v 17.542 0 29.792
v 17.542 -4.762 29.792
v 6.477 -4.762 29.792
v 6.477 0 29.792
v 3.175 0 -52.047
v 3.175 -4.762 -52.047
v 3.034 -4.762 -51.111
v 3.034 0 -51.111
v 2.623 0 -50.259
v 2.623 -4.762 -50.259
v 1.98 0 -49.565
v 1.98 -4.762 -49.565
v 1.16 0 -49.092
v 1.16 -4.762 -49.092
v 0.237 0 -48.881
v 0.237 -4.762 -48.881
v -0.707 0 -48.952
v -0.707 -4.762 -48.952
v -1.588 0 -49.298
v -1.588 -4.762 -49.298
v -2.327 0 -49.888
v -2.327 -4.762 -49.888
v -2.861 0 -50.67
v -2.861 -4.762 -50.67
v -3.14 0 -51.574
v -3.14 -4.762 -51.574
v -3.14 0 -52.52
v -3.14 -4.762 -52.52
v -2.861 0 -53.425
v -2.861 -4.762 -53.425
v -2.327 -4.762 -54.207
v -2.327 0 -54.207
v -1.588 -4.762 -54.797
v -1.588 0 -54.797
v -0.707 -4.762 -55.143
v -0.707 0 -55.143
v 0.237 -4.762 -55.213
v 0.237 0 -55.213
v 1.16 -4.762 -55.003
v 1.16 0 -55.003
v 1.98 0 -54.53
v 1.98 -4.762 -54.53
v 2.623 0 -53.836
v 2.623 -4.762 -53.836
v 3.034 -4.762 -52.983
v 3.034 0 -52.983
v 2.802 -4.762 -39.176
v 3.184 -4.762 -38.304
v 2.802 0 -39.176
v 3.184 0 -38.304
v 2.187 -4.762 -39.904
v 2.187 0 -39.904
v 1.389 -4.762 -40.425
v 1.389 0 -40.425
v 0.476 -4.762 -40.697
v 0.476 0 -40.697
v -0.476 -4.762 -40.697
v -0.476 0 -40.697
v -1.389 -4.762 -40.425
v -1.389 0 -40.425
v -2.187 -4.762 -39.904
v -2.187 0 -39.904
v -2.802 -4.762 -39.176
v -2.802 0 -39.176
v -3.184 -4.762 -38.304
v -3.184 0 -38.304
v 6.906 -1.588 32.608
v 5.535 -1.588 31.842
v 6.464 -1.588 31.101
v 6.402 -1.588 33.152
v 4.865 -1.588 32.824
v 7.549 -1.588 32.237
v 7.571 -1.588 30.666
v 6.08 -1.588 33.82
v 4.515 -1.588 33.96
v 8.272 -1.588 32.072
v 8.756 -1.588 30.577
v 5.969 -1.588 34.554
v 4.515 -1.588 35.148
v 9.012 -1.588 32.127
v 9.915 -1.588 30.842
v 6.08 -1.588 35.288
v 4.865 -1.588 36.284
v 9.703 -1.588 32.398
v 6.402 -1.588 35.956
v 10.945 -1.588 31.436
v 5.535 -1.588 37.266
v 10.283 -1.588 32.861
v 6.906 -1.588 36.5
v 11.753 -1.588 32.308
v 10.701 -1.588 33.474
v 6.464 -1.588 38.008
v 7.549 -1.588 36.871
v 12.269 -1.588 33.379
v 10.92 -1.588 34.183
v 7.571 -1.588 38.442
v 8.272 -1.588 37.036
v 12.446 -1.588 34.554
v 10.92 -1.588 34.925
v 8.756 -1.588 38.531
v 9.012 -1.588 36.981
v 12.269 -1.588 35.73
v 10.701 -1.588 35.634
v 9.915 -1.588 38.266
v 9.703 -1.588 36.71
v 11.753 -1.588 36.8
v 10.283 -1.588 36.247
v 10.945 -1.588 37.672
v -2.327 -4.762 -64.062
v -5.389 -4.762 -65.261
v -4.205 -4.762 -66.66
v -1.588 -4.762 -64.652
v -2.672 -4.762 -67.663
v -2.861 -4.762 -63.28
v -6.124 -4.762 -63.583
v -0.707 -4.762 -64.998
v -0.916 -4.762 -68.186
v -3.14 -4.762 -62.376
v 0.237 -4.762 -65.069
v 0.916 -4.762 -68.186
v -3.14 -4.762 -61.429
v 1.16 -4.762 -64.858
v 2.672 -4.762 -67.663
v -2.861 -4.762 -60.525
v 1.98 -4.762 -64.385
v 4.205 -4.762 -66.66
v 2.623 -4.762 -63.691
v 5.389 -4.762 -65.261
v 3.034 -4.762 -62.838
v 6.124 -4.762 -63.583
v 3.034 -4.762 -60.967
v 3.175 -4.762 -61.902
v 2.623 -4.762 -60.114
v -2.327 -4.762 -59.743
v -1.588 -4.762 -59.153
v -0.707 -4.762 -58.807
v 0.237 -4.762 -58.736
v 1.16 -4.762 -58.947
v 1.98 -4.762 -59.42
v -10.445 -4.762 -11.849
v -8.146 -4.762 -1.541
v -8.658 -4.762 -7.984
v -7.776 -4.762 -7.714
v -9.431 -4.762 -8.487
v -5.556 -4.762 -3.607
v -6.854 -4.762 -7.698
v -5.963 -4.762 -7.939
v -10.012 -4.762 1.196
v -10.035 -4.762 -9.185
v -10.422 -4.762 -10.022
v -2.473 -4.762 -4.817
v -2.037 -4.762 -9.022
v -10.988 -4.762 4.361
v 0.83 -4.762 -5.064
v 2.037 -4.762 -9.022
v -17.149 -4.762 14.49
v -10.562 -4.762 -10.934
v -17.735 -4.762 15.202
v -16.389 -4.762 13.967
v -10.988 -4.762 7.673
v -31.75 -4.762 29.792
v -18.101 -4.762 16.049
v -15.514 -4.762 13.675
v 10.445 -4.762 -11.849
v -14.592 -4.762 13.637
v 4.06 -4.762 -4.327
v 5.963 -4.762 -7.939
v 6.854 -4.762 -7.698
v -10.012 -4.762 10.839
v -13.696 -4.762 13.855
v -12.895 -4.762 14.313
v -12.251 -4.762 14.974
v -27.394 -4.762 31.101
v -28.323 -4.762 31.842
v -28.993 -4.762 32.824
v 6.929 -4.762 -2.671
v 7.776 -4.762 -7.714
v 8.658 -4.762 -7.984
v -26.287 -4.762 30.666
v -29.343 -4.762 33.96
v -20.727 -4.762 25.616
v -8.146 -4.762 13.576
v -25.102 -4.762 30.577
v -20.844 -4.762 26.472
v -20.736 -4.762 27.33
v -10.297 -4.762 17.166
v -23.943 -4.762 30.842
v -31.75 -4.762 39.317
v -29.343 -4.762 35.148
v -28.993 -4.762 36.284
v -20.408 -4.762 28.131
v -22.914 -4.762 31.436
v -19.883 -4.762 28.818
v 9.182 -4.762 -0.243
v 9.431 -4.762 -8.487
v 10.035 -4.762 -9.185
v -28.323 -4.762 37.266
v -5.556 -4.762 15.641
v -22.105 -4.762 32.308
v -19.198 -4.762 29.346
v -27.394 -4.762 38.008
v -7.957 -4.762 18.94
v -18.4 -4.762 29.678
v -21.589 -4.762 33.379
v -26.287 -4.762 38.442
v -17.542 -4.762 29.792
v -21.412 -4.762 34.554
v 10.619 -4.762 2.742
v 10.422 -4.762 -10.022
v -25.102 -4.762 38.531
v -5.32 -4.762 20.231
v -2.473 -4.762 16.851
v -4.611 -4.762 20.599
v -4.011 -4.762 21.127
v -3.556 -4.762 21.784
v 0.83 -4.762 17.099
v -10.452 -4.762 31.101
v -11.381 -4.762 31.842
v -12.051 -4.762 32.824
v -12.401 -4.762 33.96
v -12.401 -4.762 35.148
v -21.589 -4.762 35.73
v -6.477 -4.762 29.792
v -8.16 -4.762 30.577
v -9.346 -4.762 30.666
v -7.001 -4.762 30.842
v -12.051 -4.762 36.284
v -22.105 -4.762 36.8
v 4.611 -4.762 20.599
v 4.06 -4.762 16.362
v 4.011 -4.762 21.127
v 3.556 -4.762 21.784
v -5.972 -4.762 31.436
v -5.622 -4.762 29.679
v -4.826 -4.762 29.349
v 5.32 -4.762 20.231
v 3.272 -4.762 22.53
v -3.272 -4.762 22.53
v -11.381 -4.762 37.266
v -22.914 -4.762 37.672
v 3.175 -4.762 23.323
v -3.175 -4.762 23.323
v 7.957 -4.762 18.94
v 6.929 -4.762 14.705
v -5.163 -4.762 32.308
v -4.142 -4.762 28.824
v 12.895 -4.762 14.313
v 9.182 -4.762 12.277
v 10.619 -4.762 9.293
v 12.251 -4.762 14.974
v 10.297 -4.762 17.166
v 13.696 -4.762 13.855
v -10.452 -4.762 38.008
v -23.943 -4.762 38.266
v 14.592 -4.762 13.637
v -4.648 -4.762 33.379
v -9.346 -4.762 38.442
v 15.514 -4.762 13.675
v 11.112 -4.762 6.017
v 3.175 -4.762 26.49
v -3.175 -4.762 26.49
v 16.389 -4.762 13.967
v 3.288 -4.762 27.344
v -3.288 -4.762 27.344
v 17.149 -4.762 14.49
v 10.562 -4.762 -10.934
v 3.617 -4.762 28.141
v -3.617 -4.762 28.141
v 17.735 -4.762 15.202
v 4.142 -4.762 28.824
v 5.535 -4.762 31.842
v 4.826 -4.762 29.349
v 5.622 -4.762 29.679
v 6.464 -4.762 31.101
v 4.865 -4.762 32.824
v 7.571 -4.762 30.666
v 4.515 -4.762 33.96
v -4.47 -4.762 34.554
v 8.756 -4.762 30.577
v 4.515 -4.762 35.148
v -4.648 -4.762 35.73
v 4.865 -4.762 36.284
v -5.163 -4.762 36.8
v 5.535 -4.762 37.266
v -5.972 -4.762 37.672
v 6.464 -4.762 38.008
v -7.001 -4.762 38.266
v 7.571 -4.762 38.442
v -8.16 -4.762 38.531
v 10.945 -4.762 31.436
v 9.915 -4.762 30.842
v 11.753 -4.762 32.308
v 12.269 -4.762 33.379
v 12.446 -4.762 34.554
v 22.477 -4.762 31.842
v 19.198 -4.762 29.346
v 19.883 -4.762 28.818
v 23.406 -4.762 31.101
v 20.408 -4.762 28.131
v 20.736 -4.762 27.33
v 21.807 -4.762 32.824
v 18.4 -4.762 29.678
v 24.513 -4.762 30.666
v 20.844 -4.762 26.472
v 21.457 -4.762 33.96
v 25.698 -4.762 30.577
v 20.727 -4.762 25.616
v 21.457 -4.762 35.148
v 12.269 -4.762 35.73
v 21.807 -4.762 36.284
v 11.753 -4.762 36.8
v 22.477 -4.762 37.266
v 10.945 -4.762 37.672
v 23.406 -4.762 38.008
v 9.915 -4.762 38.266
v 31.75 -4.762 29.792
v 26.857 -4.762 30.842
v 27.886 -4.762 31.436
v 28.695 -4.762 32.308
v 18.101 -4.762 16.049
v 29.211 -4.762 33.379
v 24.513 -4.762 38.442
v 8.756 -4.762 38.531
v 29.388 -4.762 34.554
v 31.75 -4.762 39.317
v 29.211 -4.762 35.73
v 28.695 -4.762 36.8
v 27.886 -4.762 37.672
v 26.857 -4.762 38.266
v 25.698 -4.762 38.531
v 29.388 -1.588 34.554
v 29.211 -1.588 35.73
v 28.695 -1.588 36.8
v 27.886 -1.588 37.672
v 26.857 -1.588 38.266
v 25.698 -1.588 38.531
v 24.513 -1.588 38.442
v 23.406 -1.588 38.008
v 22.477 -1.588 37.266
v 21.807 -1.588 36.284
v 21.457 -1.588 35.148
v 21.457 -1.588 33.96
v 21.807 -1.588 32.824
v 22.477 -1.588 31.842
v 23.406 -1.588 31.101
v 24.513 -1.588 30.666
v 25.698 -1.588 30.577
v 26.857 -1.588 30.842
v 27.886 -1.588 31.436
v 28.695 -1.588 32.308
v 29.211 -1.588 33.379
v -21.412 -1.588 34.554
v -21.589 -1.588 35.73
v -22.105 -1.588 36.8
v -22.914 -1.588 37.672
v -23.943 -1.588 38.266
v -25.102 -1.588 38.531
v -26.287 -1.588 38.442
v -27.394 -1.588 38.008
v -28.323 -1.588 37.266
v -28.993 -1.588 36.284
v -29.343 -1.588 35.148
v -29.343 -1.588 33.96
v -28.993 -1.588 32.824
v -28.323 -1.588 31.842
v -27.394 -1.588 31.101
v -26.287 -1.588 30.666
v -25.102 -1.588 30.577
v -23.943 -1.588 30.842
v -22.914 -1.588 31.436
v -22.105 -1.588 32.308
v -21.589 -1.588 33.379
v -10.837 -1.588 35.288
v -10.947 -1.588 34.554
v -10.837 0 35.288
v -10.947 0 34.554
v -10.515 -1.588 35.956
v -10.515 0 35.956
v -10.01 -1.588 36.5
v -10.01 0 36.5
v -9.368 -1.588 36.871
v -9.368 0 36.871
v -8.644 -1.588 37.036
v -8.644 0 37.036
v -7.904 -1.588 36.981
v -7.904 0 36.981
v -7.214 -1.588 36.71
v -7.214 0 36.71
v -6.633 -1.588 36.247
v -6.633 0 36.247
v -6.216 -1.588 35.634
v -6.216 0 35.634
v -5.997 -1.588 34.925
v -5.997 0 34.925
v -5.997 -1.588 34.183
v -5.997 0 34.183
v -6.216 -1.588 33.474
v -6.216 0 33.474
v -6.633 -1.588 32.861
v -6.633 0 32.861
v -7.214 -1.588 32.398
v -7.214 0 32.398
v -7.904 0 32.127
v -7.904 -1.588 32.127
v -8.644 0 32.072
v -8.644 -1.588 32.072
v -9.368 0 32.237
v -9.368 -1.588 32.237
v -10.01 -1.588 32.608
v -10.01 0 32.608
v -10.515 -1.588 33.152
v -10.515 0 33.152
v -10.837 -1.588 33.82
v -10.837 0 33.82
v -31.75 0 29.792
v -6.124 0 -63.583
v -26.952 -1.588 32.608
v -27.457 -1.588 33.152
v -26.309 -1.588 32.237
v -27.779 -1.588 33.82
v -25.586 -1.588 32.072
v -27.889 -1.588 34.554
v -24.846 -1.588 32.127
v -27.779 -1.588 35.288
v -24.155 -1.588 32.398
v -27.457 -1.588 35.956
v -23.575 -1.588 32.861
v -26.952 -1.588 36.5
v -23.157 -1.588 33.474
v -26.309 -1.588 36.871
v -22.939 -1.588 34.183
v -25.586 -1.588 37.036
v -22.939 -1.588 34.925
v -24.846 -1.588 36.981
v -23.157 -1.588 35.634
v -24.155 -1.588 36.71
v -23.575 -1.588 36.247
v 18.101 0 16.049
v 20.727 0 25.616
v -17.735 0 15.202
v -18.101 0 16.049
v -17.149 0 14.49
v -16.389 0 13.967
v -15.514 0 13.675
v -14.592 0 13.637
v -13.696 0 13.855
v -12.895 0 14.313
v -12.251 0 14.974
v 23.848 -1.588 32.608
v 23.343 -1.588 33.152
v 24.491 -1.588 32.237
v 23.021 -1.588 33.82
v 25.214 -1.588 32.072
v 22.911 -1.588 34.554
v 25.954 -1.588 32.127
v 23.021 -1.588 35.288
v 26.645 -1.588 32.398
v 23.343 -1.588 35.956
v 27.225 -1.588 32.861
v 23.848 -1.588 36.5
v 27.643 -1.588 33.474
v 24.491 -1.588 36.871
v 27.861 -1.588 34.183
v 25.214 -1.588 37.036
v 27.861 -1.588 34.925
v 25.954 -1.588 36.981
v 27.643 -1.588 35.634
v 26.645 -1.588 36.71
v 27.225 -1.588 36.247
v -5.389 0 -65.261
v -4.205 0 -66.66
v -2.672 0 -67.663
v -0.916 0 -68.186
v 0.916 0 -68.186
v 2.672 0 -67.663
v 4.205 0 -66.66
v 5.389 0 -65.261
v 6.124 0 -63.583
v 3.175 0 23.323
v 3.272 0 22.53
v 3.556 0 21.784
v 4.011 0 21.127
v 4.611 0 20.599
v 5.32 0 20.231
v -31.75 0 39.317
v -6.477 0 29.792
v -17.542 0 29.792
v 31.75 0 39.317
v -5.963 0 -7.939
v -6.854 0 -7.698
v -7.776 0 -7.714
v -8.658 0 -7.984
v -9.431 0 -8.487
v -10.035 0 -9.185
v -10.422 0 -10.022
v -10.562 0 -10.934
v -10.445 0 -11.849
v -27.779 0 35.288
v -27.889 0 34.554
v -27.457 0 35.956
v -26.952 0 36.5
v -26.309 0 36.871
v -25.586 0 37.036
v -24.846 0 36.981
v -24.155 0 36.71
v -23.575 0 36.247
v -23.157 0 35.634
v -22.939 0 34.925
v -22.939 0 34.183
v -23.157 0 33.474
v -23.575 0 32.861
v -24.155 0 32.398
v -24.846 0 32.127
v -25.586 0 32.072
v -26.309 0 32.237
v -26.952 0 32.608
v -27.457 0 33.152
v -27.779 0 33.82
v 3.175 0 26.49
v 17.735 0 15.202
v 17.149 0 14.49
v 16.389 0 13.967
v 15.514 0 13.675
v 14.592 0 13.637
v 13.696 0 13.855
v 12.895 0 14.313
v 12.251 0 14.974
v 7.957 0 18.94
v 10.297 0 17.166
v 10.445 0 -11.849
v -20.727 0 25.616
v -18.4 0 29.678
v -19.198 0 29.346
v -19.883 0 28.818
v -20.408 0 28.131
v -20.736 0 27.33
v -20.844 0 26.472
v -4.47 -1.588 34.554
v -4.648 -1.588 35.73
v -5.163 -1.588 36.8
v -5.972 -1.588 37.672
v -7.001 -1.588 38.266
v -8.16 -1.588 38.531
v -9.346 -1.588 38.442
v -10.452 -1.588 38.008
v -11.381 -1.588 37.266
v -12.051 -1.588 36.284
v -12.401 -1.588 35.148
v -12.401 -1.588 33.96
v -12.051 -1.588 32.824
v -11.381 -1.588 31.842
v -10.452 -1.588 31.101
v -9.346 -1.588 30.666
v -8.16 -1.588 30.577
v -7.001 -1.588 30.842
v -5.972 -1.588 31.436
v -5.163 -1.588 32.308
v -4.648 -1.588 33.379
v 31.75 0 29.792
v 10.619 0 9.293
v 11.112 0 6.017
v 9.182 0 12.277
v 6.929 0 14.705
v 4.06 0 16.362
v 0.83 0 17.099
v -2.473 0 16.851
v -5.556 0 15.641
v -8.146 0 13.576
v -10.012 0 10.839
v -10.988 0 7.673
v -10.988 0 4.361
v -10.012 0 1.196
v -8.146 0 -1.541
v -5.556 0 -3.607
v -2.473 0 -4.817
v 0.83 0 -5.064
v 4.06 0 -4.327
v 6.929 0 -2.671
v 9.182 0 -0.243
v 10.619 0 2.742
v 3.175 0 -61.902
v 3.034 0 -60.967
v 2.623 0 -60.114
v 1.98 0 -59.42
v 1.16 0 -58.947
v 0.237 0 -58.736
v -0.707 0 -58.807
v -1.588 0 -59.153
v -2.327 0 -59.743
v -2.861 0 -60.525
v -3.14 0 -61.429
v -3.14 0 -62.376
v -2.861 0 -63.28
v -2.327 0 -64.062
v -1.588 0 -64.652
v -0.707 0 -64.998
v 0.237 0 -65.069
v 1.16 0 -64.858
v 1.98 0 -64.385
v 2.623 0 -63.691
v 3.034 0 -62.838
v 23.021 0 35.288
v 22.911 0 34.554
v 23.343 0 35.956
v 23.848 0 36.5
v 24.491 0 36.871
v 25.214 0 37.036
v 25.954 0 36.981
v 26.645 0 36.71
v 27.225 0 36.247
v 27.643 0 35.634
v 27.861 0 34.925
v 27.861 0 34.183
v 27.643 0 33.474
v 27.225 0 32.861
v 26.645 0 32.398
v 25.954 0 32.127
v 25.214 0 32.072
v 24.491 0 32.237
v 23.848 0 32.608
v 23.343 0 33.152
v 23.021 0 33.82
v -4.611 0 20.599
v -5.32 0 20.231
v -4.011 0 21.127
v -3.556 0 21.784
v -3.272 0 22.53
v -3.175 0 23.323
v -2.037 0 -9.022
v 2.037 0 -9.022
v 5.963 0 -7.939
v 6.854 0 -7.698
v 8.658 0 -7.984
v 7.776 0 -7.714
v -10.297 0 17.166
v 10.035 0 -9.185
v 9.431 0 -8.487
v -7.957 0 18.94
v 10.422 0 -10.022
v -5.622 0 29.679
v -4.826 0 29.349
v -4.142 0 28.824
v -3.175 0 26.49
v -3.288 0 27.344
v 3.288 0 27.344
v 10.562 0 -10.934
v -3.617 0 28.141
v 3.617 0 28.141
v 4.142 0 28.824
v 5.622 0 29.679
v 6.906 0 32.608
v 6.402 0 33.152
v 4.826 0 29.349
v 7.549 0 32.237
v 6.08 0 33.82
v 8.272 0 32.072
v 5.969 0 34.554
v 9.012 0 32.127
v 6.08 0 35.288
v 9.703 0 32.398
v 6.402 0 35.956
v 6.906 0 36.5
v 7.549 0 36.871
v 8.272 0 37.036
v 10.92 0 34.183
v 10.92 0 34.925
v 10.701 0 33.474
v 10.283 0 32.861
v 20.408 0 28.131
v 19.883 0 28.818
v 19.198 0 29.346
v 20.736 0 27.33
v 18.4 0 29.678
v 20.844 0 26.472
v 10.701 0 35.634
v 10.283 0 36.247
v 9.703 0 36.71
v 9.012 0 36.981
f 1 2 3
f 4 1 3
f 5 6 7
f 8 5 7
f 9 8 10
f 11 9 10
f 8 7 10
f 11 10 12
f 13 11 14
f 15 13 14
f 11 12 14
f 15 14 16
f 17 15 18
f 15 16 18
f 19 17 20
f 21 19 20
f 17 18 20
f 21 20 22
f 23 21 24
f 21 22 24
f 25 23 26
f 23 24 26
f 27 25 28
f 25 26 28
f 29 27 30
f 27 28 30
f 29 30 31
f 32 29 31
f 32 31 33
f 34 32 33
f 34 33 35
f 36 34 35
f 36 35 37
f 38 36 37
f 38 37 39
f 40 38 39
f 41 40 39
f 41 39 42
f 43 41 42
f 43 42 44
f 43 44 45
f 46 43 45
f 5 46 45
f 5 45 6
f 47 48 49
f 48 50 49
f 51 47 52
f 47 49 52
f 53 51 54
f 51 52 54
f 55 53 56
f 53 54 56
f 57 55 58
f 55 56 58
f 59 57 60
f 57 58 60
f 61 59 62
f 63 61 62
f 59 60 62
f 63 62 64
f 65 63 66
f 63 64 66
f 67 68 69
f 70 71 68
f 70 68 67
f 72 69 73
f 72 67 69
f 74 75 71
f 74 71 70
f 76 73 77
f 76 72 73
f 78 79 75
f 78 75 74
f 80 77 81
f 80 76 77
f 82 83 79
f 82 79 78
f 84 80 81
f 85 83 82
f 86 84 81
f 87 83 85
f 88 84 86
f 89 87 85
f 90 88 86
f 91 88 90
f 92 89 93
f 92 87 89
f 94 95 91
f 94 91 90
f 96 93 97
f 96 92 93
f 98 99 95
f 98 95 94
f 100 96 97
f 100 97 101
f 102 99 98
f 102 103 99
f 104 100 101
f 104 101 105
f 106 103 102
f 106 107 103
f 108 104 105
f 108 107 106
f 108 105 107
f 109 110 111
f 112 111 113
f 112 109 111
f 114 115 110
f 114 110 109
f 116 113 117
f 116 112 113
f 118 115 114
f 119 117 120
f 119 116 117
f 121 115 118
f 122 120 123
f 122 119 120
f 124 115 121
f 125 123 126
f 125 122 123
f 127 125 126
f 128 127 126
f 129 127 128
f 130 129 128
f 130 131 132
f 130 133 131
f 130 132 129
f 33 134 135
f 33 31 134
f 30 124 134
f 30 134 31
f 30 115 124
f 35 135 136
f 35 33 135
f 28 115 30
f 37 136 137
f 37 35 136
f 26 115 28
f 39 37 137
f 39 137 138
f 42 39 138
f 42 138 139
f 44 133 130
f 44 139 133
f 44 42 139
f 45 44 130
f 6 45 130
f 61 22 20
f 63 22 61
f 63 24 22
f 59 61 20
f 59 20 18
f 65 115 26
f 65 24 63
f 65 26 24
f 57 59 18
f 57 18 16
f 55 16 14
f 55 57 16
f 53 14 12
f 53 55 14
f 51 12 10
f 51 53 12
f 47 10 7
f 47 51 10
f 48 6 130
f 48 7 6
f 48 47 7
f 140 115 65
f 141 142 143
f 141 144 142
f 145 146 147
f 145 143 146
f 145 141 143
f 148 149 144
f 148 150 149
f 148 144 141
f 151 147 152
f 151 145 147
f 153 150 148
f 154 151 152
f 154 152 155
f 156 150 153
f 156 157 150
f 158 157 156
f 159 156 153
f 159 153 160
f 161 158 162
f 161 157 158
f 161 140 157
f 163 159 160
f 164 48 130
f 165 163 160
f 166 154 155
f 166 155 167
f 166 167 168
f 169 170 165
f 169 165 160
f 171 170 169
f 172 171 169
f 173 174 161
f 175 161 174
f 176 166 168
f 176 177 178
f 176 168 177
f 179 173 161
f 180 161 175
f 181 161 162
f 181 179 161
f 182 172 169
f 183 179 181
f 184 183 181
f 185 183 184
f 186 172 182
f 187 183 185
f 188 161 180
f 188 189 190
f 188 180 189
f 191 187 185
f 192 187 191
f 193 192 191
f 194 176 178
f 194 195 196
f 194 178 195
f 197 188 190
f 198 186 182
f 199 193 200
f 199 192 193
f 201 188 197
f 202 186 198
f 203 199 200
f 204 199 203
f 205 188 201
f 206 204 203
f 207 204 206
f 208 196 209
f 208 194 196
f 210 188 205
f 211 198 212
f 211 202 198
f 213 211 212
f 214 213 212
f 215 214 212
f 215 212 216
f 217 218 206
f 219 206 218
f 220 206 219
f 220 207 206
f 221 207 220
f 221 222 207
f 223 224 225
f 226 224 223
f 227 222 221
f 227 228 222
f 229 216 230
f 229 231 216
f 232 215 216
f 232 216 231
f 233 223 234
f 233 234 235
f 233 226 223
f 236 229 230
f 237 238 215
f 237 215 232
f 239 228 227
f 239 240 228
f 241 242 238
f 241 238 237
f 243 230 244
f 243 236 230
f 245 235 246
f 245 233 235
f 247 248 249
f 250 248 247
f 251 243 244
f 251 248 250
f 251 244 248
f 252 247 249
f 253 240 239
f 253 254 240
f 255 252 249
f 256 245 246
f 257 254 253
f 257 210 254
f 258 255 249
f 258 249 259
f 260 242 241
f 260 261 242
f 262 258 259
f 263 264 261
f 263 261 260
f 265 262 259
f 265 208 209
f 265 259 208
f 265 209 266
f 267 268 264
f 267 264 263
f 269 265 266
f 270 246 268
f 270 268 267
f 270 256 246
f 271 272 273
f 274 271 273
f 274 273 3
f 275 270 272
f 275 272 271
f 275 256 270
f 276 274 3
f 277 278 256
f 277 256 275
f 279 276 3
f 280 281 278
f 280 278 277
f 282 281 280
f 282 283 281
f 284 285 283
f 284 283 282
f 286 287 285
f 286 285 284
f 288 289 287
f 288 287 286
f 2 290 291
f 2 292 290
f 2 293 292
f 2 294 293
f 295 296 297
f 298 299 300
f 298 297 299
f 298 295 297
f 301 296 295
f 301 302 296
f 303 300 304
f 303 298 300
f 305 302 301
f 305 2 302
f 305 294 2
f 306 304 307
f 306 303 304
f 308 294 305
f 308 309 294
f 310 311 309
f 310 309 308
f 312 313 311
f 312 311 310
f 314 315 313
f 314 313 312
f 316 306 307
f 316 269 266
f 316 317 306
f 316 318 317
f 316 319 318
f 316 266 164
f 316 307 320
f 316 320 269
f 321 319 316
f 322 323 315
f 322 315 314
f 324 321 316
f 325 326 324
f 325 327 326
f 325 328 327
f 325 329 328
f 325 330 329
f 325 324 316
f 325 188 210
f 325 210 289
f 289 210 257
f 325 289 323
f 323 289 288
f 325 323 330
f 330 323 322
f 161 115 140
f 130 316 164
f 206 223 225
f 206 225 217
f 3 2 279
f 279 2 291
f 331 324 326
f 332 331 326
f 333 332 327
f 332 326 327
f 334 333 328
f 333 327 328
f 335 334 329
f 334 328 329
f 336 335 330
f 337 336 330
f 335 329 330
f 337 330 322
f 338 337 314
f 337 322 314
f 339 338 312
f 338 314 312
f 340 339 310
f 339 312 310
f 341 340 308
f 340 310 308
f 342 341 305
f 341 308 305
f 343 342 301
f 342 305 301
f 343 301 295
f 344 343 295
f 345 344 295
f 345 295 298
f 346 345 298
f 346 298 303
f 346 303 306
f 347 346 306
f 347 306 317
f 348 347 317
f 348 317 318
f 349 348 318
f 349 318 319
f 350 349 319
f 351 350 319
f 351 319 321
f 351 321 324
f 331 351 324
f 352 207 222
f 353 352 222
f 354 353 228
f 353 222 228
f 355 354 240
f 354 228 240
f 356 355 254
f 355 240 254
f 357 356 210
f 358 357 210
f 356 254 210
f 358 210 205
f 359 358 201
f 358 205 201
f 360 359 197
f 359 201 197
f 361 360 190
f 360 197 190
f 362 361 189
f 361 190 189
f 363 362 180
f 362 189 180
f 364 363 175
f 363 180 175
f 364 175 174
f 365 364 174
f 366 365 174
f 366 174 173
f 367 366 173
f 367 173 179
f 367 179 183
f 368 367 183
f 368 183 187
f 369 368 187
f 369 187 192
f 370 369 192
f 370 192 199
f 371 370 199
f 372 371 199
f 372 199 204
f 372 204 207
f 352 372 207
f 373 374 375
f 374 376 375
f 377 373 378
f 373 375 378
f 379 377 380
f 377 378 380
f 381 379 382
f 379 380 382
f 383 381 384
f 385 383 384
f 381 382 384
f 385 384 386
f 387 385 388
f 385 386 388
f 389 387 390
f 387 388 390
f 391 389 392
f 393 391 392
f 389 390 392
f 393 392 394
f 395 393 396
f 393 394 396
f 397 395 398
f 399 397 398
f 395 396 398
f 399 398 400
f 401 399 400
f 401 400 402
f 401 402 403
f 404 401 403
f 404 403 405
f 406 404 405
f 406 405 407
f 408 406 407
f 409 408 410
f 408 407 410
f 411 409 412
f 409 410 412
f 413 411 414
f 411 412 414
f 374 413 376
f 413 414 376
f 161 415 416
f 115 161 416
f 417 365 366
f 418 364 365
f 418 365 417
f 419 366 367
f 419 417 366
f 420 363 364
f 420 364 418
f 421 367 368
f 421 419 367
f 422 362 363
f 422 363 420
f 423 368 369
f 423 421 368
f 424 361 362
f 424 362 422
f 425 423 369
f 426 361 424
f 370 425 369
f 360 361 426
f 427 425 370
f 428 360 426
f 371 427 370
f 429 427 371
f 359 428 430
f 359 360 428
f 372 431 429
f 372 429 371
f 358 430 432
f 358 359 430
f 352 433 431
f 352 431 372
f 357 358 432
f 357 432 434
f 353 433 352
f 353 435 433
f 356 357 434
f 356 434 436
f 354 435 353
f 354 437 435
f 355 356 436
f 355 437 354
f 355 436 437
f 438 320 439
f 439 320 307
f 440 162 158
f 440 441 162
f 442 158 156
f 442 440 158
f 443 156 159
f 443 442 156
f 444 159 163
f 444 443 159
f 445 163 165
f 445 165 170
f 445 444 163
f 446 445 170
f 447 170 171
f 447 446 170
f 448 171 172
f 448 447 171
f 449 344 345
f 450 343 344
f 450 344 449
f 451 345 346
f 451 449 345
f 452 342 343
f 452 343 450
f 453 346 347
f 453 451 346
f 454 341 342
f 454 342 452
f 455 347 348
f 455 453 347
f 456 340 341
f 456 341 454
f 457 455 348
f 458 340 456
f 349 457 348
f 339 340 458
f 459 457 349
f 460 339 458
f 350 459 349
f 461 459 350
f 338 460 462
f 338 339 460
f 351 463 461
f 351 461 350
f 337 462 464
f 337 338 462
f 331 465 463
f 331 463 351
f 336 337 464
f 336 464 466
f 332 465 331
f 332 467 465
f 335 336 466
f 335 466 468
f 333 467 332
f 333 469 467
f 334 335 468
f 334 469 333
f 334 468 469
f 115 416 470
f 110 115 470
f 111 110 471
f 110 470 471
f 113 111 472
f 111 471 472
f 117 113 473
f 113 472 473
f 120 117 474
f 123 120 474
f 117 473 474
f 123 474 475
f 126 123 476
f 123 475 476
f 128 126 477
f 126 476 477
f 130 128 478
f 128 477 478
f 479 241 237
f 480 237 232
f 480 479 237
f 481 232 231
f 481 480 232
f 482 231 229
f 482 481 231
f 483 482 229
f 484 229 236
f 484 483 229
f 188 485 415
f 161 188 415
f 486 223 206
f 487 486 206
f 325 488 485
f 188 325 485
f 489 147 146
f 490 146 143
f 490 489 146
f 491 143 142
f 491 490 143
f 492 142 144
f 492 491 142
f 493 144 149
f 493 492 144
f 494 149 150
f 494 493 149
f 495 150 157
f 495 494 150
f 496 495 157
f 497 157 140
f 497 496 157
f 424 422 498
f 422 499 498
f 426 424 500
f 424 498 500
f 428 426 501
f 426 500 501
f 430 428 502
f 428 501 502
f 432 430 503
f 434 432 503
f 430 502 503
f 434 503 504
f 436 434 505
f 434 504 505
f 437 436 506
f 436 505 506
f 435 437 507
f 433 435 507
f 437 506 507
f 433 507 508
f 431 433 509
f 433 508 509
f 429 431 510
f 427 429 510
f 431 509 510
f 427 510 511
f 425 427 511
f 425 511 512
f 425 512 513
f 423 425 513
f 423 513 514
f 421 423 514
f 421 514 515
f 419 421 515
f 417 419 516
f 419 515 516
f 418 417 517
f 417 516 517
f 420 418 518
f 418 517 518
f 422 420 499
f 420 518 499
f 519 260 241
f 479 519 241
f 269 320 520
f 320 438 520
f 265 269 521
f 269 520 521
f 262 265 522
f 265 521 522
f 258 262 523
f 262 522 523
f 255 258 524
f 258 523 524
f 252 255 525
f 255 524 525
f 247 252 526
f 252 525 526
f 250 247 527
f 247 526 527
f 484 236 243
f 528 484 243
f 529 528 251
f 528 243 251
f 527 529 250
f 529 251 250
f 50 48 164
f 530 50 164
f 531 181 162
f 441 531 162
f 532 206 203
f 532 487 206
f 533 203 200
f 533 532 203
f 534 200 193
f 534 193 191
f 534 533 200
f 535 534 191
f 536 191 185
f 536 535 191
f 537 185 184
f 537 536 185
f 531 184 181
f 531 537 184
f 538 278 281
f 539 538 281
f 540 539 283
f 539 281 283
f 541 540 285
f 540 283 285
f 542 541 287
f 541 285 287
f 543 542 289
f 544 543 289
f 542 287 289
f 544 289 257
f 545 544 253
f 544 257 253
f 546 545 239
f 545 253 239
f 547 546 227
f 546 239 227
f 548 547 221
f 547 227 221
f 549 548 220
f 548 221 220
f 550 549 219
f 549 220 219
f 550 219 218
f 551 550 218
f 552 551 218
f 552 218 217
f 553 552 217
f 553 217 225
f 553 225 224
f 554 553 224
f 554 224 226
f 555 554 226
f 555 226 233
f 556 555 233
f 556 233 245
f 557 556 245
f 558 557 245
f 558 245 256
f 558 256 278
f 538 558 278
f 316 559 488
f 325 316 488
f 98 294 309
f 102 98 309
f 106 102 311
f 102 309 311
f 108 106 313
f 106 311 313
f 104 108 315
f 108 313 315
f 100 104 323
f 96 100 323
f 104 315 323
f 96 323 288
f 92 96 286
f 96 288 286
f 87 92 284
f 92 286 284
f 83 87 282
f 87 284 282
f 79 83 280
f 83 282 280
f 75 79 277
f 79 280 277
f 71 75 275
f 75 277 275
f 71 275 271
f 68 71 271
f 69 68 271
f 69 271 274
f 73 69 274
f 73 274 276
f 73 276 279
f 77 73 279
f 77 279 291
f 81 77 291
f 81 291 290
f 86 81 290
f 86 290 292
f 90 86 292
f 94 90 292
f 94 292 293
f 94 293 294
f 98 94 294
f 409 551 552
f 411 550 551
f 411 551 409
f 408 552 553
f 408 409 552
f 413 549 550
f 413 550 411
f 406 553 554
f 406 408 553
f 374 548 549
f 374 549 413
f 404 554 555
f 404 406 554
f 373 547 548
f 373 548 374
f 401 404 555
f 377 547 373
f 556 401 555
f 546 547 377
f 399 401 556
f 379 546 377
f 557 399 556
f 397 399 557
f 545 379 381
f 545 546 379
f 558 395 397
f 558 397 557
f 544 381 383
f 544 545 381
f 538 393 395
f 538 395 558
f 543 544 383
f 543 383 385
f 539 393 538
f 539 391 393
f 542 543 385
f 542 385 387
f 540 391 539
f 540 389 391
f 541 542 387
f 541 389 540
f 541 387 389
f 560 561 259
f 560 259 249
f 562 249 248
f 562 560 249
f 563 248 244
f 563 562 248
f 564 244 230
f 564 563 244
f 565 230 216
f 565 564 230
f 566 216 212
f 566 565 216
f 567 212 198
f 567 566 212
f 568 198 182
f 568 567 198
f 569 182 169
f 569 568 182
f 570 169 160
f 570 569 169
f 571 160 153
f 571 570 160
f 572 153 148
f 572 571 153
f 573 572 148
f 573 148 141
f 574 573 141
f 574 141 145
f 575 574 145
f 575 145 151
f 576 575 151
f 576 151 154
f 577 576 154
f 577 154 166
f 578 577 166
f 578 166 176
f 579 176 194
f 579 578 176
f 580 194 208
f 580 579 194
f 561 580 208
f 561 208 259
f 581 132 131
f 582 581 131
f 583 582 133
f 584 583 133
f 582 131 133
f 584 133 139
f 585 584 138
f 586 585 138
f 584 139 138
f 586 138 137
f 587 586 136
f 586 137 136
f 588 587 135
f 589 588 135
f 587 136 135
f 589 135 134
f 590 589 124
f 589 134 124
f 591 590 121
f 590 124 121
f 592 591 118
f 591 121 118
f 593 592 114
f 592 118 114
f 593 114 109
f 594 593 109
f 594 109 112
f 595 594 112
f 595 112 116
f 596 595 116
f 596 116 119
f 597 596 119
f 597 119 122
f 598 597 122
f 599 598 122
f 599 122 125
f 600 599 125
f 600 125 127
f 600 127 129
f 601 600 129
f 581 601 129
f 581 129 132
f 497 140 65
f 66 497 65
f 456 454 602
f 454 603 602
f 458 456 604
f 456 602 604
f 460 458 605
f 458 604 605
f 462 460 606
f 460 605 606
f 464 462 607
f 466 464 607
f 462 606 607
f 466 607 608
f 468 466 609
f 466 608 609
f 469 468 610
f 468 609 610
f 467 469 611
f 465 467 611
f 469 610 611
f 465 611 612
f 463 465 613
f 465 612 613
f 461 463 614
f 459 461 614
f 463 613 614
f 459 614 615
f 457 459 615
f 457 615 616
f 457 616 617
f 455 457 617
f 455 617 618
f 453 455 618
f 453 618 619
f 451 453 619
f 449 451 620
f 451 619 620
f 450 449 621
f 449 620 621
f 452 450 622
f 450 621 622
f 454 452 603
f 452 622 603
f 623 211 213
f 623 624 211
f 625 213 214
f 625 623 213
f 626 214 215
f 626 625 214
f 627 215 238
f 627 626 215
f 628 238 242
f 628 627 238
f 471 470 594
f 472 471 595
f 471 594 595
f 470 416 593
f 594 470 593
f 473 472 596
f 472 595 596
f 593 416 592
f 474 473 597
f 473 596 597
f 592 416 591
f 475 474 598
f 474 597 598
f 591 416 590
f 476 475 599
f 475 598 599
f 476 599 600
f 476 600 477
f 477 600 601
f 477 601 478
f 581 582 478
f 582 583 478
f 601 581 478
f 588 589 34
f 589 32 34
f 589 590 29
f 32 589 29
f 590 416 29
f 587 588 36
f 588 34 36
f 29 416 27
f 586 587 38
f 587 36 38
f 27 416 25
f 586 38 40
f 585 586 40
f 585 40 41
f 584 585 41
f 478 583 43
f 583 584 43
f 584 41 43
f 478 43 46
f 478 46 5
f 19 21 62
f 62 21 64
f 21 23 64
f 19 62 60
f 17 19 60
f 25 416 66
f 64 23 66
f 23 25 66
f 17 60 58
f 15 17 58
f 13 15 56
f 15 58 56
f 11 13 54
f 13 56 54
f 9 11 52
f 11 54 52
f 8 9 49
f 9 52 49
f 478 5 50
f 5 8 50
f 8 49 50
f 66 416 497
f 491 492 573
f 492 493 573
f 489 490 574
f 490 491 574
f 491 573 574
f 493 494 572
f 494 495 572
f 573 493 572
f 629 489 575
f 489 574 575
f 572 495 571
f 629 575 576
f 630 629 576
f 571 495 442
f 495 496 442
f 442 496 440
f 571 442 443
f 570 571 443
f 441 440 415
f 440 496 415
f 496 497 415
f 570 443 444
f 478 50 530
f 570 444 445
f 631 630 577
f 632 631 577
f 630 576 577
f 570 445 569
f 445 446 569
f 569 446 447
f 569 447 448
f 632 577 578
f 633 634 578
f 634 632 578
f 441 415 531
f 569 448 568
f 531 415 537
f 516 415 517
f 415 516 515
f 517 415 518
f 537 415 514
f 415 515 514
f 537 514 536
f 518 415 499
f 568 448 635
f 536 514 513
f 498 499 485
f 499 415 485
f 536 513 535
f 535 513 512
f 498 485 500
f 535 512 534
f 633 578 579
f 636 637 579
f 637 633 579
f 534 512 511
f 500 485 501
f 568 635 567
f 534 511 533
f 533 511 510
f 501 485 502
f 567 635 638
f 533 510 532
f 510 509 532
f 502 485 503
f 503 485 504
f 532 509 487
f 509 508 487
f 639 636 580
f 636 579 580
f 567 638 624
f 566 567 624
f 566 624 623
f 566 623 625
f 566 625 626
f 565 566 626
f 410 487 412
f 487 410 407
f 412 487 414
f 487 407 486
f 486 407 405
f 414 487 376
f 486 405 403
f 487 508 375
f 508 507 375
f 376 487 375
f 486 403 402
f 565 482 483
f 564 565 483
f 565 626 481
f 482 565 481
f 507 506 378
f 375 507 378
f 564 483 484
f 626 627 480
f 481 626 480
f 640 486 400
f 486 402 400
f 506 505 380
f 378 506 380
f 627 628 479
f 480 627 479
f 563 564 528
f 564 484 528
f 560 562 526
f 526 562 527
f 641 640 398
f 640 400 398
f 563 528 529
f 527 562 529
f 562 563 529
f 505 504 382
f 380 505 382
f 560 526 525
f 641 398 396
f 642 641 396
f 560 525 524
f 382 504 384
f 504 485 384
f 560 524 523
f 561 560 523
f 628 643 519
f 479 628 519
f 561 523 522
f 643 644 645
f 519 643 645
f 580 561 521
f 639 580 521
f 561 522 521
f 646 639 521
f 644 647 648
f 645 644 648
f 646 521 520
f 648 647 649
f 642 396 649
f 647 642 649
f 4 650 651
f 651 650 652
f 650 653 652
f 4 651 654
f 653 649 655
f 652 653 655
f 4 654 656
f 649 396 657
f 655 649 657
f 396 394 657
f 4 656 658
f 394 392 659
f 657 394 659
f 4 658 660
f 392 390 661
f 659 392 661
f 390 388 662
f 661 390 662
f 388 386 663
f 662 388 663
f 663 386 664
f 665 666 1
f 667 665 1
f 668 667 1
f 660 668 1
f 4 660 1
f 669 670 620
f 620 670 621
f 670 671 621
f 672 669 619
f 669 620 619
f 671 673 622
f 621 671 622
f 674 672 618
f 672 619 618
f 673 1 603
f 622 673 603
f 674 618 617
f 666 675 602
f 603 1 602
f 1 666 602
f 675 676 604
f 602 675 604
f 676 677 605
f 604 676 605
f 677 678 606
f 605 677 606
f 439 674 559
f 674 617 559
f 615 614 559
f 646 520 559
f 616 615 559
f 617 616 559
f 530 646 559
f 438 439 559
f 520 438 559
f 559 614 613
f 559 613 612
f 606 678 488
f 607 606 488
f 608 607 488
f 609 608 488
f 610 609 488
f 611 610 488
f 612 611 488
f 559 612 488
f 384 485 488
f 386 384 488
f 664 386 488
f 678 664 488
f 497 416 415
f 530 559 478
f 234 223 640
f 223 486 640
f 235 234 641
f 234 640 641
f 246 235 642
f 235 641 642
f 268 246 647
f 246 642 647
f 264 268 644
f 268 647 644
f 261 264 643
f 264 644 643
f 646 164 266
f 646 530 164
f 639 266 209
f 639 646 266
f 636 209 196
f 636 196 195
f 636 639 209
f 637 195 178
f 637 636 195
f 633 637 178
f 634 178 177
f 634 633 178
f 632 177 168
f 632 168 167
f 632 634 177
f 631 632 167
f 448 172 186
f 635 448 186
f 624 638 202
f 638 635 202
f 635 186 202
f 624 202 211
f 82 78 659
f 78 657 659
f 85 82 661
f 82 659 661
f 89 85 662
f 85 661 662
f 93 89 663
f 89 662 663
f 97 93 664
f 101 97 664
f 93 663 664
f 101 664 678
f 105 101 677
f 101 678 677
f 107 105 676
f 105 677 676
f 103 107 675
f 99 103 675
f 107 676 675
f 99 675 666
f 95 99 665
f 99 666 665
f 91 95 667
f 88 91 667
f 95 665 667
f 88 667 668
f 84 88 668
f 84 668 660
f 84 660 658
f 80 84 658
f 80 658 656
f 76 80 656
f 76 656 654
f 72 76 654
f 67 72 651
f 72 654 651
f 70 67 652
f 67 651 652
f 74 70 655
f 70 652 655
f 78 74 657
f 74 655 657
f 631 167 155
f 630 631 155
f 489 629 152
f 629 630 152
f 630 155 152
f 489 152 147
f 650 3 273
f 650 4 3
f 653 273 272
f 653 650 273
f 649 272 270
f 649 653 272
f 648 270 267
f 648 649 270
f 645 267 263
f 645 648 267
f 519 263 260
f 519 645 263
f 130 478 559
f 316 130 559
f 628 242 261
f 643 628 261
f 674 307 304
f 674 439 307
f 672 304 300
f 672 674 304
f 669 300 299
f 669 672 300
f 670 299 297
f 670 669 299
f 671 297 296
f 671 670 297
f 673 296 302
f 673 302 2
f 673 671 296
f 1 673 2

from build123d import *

# Parameters (mm, degrees)
F0_R           = 11.1125
F1_DEPTH       = 4.7625
F3_DEPTH       = 4.7635
F4_R           = 3.302
F5_R           = 3.175
F6_DEPTH       = 4.7635
F8_D           = 4.9784
F8_CBORE_D     = 7.9756
F8_CBORE_DEPTH = 3.175


with BuildPart() as f1:
    # F0 (on Front) → F1 (new body)
    with BuildSketch(Plane.XZ):
        with BuildLine():
            Line((31.75, 29.791584), (31.75, 39.316584))
            Line((31.75, 39.316584), (-31.75, 39.316584))
            Line((-31.75, 39.316584), (-31.75, 29.791584))
            Line((-31.75, 29.791584), (-6.123568, -63.583015))
            ThreePointArc((-6.123568, -63.583015), (0, -68.252416), (6.123568, -63.583015))
            Line((6.123568, -63.583015), (31.75, 29.791584))
        make_face()
        with Locations((0, 6.017184)):
            Circle(F0_R, mode=Mode.SUBTRACT)
    extrude(amount=F1_DEPTH)

    # F2 (on face) → F3 (cut, through all)
    with BuildSketch(Plane.XZ.offset(4.7625)):
        with BuildLine():
            Line((-3.175, 29.791584), (-21.872793, 29.791584))
            Line((-21.872793, 29.791584), (-15.161242, 5.336816))
            ThreePointArc((-15.161242, 5.336816), (-12.011665, 15.293285), (-3.175, 20.857855))
            Line((-3.175, 20.857855), (-3.175, 29.791584))
        make_face()
        with BuildLine():
            Line((15.161242, 5.336816), (21.872793, 29.791584))
            Line((21.872793, 29.791584), (3.175, 29.791584))
            Line((3.175, 29.791584), (3.175, 20.857855))
            ThreePointArc((3.175, 20.857855), (12.011665, 15.293285), (15.161242, 5.336816))
        make_face()
        with BuildLine():
            Line((0, -49.905946), (13.384579, -1.13678))
            ThreePointArc((13.384579, -1.13678), (0, -9.159316), (-13.384579, -1.13678))
            Line((-13.384579, -1.13678), (0, -49.905946))
        make_face()
    extrude(amount=-F3_DEPTH, mode=Mode.SUBTRACT)

    # F4
    f4_edges = [f1.edges().sort_by_distance(p)[0] for p in [
        (-21.872793, -2.38125, 29.791584),
        (3.175, -2.38125, 29.791584),
        (-3.175, -2.38125, 29.791584),
        (21.872793, -2.38125, 29.791584),
        (3.175, -2.38125, 20.857855),
        (-3.175, -2.38125, 20.857855),
        (15.161242, -2.38125, 5.336816),
        (-15.161242, -2.38125, 5.336816),
        (-13.384579, -2.38125, -1.13678),
        (13.384579, -2.38125, -1.13678),
        (0, -2.38125, -49.905946),
    ]]
    fillet(f4_edges, radius=F4_R)

    # F5 (on face) → F6 (cut, through all)
    with BuildSketch(Plane.XZ.offset(4.7625)):
        with Locations((0, -61.902416)):
            Circle(F5_R)
        with Locations((0, -52.047216)):
            Circle(F5_R)
    extrude(amount=-F6_DEPTH, mode=Mode.SUBTRACT)

    # F8 (through all)
    with Locations(Plane.XZ.offset(4.7625)):
        with Locations((-25.4, 34.554084), (-8.4582, 34.554084), (8.4582, 34.554084), (25.4, 34.554084)):
            CounterBoreHole(F8_D / 2, F8_CBORE_D / 2, F8_CBORE_DEPTH)


solid = f1.part
